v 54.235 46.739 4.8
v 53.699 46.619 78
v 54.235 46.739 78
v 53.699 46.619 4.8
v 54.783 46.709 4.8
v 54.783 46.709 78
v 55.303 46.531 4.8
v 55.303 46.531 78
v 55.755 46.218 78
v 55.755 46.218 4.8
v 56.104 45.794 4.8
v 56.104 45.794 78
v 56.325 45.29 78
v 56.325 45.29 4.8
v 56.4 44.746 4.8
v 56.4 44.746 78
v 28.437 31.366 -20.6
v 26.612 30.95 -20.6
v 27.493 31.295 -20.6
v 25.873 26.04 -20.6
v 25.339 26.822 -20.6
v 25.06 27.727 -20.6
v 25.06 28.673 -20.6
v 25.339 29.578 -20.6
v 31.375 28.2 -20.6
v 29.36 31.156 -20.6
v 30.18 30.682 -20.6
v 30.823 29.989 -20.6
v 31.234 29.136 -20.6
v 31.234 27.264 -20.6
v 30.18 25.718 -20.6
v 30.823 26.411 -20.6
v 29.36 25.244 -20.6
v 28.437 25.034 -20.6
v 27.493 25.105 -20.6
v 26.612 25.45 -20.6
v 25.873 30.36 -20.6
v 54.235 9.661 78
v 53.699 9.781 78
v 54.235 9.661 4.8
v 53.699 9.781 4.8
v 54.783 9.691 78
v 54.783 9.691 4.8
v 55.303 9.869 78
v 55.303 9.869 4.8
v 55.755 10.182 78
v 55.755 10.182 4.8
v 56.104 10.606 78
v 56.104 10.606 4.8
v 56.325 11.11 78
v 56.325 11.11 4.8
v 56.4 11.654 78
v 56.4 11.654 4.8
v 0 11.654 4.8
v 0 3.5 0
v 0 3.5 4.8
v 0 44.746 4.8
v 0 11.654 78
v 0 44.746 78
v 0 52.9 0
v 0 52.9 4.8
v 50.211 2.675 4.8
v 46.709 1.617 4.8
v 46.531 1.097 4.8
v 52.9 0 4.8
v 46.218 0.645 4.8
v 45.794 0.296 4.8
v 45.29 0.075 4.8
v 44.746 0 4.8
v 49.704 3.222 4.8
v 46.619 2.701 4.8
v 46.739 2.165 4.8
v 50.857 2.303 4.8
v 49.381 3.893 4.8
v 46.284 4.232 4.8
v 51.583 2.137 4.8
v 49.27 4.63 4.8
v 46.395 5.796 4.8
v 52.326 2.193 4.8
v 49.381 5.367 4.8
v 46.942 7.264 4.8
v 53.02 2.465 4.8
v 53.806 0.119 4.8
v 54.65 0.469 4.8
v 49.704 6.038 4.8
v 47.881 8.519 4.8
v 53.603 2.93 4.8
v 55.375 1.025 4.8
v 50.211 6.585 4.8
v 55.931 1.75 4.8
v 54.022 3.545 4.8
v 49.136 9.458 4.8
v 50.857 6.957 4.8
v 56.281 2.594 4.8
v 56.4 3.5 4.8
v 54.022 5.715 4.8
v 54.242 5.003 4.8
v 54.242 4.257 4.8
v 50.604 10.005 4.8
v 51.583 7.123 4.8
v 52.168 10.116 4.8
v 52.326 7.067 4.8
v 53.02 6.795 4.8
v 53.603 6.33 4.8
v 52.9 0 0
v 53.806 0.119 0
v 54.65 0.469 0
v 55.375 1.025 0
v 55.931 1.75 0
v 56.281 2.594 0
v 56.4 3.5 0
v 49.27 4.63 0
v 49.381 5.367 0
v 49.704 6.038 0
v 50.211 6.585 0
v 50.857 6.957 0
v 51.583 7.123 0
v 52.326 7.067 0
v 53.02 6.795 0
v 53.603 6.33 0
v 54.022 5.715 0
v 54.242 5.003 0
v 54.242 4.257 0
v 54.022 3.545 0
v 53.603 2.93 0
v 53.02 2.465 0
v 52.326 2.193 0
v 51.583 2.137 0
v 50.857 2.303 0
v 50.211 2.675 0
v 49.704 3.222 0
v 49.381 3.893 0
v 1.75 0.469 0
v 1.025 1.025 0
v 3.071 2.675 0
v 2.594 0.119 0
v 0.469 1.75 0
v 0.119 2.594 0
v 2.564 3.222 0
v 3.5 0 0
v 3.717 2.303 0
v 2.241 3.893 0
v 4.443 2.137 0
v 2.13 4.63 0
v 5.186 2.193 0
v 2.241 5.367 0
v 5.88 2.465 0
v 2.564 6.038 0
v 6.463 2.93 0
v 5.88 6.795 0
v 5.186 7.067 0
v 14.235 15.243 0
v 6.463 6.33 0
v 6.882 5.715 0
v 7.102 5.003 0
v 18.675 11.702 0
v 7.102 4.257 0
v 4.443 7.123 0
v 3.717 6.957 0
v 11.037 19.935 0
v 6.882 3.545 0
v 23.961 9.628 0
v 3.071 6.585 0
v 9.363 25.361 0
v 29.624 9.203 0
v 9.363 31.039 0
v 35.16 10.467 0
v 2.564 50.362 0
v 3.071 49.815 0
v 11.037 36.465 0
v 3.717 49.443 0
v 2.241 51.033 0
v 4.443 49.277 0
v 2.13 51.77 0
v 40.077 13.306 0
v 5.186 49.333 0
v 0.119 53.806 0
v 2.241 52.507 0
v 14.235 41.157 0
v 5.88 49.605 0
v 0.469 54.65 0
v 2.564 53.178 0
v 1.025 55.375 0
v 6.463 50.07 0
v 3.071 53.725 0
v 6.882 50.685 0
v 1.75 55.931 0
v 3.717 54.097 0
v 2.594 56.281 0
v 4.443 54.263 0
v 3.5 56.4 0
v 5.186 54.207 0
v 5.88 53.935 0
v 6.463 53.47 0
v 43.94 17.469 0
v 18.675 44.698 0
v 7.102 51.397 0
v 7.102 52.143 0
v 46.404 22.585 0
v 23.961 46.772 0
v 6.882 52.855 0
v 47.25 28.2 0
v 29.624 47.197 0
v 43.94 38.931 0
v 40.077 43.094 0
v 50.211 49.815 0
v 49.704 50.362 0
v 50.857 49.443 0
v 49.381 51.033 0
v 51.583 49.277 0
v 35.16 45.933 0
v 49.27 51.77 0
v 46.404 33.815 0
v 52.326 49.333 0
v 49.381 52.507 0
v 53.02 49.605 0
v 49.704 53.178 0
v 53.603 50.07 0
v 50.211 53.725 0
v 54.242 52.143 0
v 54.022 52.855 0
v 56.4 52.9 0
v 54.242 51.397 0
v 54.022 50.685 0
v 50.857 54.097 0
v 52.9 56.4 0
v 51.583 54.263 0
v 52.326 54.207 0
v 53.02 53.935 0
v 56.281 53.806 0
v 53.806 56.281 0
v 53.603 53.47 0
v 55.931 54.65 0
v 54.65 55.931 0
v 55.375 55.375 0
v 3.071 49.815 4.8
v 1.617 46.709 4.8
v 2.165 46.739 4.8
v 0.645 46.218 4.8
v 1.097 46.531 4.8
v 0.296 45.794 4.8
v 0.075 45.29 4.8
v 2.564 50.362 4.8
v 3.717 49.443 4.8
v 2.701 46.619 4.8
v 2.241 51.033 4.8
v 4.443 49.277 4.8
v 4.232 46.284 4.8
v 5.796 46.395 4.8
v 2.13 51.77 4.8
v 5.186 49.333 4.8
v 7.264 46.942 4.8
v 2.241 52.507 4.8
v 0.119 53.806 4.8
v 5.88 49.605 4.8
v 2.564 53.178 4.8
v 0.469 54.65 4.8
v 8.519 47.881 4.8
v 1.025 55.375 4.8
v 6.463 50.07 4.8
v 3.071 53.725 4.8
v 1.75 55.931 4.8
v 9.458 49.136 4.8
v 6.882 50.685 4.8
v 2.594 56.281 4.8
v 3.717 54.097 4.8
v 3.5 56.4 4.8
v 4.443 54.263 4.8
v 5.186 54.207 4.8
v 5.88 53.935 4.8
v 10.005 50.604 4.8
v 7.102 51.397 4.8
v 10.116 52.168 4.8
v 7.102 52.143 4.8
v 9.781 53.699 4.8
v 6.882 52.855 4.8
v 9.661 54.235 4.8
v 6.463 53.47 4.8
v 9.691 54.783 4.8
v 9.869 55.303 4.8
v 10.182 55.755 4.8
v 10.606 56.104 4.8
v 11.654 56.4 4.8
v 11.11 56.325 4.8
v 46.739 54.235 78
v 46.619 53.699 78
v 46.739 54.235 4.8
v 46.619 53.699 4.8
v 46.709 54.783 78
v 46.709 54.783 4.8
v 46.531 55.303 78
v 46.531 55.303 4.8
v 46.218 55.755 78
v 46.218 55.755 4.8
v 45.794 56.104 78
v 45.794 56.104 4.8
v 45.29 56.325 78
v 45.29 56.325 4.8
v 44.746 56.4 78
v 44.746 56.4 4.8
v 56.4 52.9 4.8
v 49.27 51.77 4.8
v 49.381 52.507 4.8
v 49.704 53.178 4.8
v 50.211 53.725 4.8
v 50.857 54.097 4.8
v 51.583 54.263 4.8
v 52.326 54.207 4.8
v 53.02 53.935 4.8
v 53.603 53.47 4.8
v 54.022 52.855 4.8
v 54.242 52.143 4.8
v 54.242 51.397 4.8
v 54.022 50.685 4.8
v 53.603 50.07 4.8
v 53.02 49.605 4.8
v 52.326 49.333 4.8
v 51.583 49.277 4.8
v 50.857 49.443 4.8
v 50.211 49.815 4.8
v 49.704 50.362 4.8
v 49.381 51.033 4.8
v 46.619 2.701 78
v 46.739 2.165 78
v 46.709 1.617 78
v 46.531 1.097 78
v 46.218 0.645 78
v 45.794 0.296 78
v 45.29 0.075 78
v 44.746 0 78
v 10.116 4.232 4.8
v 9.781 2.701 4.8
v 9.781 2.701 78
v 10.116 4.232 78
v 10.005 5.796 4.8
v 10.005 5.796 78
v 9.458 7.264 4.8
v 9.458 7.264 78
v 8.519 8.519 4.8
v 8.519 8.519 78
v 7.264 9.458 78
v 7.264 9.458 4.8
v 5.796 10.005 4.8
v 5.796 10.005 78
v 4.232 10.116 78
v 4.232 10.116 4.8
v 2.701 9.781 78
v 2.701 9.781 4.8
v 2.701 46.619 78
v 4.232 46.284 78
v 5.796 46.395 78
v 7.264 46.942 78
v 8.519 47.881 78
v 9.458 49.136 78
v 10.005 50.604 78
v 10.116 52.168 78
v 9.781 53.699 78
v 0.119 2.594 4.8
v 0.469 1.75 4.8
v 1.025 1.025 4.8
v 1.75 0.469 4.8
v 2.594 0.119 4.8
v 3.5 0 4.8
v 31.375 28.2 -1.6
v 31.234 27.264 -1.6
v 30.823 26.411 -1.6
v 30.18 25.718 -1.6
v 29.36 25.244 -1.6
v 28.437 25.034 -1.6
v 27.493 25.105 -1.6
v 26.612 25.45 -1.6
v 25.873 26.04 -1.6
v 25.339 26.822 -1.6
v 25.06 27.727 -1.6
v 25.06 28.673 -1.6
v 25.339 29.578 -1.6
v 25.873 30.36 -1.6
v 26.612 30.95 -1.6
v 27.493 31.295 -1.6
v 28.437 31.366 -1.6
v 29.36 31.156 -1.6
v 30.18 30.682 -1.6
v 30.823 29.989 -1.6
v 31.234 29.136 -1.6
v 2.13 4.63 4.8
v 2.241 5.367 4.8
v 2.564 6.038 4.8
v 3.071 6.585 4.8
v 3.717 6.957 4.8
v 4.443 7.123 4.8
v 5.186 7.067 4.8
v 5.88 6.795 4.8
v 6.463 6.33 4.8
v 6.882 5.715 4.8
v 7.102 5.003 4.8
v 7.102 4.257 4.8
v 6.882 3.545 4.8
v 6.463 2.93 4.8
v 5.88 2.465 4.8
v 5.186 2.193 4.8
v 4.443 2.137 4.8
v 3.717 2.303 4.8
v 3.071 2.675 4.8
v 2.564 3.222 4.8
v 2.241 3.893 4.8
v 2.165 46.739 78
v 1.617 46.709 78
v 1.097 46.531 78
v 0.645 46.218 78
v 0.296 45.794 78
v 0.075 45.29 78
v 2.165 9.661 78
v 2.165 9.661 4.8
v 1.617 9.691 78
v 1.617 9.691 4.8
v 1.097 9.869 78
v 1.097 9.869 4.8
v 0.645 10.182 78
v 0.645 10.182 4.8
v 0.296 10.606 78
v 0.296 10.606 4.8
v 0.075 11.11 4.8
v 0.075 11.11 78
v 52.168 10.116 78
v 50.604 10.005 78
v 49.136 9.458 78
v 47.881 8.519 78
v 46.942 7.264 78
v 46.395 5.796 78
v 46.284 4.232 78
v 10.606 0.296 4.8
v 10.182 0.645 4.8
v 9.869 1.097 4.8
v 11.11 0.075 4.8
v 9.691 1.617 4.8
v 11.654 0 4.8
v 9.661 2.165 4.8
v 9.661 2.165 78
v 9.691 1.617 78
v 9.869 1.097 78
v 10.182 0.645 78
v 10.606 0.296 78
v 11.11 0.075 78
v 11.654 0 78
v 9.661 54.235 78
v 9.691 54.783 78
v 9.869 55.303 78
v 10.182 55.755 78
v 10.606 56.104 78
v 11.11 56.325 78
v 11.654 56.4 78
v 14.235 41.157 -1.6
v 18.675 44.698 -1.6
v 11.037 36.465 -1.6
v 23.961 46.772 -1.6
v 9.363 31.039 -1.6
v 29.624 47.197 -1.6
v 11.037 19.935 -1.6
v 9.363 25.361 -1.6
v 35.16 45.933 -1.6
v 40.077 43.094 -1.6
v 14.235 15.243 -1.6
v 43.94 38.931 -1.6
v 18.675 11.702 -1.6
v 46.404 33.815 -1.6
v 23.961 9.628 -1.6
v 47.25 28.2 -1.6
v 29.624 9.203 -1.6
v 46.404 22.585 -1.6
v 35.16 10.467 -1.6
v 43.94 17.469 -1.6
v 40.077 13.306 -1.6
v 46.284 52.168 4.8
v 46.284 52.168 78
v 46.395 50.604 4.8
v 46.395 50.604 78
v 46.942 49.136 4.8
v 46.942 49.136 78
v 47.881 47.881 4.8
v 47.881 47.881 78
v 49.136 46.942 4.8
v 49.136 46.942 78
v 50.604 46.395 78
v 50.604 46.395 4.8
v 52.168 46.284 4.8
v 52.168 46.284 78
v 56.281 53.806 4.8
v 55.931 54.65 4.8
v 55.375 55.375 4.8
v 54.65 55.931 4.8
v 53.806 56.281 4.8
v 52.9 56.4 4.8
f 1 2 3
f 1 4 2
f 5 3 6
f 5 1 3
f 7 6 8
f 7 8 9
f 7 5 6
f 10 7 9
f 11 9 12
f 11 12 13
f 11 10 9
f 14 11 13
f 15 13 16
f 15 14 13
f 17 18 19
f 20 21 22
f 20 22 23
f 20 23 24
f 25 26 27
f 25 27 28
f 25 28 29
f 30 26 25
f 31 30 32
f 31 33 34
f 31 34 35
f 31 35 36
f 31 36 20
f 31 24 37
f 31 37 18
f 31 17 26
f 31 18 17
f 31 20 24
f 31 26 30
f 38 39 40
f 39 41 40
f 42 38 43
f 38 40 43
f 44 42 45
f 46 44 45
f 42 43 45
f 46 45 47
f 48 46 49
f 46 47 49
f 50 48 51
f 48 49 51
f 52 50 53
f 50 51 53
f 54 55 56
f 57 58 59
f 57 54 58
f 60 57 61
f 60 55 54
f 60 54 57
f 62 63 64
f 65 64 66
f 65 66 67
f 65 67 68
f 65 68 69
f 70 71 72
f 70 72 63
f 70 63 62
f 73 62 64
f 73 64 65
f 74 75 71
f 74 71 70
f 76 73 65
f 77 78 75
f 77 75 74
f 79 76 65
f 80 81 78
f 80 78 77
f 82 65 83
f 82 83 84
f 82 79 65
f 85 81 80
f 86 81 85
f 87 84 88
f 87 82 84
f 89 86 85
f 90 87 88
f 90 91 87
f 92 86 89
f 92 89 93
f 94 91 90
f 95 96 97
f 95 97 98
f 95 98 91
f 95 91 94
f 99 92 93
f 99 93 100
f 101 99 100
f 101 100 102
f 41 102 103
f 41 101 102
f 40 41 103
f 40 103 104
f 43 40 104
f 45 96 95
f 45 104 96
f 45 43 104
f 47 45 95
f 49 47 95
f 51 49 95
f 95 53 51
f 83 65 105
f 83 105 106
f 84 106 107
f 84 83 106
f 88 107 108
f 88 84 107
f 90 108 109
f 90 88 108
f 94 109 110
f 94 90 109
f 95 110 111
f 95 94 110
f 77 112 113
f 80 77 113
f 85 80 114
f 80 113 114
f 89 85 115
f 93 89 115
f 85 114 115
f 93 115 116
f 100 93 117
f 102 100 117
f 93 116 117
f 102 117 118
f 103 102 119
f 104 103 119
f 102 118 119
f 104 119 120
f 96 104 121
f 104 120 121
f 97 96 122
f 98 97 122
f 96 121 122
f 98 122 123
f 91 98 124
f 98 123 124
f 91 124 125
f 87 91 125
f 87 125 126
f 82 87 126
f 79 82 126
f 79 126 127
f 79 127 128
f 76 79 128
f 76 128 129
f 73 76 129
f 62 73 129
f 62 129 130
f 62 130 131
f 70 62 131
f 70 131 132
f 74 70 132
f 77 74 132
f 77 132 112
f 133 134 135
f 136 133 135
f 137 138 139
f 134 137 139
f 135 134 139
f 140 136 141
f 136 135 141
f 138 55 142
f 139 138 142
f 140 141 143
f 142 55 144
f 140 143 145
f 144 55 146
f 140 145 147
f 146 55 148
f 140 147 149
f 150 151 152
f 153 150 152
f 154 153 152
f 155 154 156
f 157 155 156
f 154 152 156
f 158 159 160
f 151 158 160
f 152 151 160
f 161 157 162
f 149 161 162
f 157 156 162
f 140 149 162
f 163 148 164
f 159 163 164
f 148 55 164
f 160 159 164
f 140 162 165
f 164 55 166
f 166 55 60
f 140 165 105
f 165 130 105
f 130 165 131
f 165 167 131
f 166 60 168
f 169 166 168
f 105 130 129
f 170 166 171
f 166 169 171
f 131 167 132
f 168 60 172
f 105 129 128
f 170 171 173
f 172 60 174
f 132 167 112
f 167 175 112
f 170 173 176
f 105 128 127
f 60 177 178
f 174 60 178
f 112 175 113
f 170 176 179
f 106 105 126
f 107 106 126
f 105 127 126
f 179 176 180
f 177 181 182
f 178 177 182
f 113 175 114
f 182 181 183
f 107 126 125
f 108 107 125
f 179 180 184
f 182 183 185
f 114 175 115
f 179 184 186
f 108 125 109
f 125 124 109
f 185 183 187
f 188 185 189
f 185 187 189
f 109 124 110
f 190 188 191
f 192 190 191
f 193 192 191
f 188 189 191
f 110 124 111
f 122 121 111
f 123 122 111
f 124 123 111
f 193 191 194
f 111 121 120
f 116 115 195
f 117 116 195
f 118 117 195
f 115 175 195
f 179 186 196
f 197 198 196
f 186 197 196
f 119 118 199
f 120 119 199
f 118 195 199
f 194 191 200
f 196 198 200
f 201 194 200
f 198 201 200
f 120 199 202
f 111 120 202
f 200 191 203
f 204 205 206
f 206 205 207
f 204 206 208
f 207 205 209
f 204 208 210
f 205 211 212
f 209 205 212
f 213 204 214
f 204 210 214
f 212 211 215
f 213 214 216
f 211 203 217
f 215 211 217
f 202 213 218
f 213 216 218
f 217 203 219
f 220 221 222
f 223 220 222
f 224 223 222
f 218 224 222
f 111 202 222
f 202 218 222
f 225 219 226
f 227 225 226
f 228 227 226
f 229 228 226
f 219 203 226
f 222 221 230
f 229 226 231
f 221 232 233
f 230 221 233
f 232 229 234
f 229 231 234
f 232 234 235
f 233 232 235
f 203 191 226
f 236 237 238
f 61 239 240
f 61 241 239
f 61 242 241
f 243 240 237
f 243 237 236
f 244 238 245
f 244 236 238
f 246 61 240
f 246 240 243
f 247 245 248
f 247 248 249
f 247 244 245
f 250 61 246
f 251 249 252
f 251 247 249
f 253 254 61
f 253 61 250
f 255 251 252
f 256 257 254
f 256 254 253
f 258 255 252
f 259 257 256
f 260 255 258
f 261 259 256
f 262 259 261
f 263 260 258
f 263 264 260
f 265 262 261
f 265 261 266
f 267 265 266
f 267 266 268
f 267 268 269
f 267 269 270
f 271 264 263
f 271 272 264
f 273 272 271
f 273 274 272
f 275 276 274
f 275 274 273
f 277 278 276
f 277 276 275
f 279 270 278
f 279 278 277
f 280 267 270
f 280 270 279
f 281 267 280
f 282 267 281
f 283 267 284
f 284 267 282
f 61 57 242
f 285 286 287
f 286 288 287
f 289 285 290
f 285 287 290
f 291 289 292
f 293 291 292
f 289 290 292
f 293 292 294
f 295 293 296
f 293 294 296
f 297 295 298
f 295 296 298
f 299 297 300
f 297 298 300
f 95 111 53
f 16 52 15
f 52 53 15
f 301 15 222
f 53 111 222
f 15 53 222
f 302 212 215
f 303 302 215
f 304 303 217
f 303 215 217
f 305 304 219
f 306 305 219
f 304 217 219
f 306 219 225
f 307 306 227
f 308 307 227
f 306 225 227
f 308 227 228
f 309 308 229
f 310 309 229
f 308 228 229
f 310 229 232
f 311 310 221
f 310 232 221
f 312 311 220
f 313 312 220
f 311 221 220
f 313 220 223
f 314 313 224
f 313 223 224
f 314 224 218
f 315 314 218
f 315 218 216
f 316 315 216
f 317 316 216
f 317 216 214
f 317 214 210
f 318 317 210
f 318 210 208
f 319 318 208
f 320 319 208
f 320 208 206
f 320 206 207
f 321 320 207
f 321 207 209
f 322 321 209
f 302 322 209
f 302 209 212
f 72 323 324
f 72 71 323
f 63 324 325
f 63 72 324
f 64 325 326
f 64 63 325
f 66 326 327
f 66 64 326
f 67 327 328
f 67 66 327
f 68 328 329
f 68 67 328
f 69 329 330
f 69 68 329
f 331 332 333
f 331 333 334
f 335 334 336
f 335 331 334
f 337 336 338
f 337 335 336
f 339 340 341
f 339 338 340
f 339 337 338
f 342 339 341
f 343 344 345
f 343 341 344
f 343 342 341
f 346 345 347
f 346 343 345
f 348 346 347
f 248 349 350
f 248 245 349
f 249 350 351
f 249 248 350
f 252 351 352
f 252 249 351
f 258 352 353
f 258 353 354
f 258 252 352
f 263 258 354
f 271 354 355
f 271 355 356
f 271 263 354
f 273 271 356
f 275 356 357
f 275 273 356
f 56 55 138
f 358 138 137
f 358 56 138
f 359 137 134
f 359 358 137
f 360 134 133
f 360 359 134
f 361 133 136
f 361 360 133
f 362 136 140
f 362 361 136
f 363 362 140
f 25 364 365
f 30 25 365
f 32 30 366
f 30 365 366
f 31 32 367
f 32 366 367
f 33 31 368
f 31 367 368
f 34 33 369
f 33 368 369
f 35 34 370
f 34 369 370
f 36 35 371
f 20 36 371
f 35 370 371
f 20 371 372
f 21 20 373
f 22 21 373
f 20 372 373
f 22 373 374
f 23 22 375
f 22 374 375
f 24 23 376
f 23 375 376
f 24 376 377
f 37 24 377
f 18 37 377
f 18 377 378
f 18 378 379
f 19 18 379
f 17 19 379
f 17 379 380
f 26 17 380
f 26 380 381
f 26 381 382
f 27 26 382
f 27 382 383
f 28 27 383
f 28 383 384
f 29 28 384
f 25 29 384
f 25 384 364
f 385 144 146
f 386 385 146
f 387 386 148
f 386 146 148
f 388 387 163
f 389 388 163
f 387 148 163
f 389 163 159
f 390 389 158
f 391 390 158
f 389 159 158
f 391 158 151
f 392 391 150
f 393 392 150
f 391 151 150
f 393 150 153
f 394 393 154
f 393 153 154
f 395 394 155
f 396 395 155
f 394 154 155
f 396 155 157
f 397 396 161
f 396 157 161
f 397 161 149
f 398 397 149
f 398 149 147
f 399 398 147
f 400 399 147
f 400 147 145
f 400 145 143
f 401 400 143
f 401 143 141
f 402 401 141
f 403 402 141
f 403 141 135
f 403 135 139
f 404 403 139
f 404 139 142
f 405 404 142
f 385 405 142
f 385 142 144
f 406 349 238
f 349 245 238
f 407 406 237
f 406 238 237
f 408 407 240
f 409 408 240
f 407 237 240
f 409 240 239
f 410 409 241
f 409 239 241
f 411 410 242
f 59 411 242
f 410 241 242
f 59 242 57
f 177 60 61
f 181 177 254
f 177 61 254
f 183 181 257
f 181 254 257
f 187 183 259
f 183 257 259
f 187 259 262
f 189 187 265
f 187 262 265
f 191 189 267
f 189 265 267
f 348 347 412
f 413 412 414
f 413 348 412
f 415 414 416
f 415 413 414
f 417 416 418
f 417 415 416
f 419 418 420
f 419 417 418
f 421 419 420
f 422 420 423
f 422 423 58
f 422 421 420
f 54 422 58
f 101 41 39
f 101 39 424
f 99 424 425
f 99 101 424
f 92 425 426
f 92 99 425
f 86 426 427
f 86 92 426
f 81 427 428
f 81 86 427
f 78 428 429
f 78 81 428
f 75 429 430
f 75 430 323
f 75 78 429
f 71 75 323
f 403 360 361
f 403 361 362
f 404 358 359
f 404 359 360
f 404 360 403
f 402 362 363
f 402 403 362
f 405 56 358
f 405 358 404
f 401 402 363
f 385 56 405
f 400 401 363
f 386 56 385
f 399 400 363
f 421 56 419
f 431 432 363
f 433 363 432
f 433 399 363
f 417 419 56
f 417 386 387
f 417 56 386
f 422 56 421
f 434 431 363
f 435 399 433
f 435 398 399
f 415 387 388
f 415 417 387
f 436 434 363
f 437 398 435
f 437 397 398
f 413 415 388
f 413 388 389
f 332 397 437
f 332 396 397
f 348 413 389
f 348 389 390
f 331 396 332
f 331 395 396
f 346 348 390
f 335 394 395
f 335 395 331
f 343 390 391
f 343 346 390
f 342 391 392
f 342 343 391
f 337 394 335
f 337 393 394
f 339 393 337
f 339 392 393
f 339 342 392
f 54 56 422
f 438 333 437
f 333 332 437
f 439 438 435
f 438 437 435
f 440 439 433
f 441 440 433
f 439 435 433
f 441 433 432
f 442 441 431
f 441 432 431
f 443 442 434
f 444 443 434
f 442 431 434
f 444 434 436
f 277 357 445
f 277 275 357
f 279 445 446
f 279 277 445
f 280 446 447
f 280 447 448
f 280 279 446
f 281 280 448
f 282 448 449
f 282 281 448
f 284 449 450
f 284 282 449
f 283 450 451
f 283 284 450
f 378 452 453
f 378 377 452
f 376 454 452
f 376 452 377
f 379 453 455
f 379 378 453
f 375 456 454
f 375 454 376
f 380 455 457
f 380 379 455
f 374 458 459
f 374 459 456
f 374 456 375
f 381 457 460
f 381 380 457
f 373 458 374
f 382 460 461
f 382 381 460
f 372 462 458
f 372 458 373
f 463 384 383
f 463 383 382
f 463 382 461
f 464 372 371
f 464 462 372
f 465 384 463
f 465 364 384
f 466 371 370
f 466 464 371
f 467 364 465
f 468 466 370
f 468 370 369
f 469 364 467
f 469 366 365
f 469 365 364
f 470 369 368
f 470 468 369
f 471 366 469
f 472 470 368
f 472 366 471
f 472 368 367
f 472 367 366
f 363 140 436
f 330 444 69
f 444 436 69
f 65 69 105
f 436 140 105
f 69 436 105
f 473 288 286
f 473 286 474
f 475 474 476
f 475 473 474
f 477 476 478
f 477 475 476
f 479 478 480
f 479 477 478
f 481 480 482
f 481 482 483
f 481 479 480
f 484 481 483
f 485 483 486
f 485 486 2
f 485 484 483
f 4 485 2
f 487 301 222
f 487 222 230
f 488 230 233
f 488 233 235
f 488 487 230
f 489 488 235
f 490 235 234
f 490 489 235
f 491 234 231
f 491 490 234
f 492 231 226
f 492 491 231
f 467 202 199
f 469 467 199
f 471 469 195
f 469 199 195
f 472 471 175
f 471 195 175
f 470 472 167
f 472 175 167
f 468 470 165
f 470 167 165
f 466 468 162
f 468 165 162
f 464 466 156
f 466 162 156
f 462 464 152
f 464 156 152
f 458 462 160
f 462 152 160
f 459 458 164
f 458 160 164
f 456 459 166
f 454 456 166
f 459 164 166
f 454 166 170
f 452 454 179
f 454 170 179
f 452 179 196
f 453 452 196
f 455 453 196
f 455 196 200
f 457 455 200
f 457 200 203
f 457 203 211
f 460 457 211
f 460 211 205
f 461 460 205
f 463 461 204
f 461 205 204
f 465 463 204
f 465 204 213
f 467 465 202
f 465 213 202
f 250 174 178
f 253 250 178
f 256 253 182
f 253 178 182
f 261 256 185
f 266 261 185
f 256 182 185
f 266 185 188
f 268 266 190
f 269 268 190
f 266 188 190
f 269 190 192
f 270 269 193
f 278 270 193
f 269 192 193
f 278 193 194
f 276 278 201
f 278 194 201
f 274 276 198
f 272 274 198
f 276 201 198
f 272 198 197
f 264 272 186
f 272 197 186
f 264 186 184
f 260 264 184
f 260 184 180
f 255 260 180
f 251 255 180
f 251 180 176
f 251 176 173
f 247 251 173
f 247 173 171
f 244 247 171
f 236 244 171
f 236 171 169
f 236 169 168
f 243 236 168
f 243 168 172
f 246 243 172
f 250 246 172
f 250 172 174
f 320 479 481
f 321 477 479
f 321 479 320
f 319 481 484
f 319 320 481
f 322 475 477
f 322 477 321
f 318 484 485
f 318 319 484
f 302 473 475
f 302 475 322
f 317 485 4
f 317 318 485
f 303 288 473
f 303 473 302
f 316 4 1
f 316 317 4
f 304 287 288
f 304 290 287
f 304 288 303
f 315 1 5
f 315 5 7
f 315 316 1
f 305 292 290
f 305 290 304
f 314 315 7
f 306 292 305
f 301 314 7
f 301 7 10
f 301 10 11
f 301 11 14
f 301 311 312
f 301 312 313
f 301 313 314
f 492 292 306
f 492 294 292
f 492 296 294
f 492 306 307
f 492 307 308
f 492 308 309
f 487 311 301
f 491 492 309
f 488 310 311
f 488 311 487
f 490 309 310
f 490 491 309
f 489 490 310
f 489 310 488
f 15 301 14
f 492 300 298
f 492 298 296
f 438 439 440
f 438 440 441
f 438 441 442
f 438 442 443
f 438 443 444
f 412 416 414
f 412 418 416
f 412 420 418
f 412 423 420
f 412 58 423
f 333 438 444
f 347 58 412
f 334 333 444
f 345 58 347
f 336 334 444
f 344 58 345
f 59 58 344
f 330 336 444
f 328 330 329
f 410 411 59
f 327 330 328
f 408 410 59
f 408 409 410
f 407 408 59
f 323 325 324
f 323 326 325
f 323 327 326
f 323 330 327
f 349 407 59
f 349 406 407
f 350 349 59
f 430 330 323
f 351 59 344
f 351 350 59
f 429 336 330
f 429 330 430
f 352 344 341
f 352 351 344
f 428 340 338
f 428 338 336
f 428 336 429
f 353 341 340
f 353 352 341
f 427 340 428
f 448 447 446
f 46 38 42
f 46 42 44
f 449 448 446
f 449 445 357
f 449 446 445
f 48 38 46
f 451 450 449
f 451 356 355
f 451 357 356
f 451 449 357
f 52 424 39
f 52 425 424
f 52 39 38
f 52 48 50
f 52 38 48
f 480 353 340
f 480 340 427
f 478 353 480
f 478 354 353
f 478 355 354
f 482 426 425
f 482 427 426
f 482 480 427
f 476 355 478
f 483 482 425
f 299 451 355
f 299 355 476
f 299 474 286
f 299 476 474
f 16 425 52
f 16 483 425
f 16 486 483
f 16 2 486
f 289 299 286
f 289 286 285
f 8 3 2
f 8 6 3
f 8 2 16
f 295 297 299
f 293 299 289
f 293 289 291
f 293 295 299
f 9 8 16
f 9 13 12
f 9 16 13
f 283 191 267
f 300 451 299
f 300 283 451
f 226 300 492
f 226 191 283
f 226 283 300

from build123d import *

# Parameters (mm, degrees)
SKETCH1_W           = 56.4
SKETCH1_H           = 56.4
BOSS_EXTRUDE1_DEPTH = 78
FILLET1_R           = 3.5
SKETCH2_R           = 19.05
BOSS_EXTRUDE2_DEPTH = 1.6
SKETCH4_R           = 3.175
BOSS_EXTRUDE3_DEPTH = 20.6
SKETCH5_R           = 2.5
CUT_EXTRUDE1_DEPTH  = 112.561283607
CUT_EXTRUDE2_START  = -73.2
SKETCH8_R           = 5.5
CUT_EXTRUDE2_DEPTH  = 73.2
FILLET2_R           = 2


with BuildPart() as part:
    # Sketch1 → Boss-Extrude1 (new body)
    with BuildSketch(Plane.XY):
        with Locations((28.2, 28.2)):
            Rectangle(SKETCH1_W, SKETCH1_H)
    extrude(amount=BOSS_EXTRUDE1_DEPTH)

    # Fillet1
    fillet1_edges = [part.edges().sort_by_distance(p)[0] for p in [
        (0, 56.4, 39),
        (56.4, 56.4, 39),
        (56.4, 0, 39),
        (0, 0, 39),
    ]]
    fillet(fillet1_edges, radius=FILLET1_R)

    # Sketch2 → Boss-Extrude2 (add)
    with BuildSketch(Plane(origin=(0, 0, 0), x_dir=(-1, 0, 0), z_dir=(0, 0, -1))):
        with Locations(Location((-28.2, 28.2, 0), (0, 0, 180))):
            Circle(SKETCH2_R)
    extrude(amount=BOSS_EXTRUDE2_DEPTH)

    # Sketch4 → Boss-Extrude3 (add)
    with BuildSketch(Plane(origin=(0, 0, 0), x_dir=(-1, 0, 0), z_dir=(0, 0, -1))):
        with Locations(Location((-28.2, 28.2, 0), (0, 0, 180))):
            Circle(SKETCH4_R)
    extrude(amount=BOSS_EXTRUDE3_DEPTH)

    # Sketch5 → Cut-Extrude1 (cut, through all)
    with BuildSketch(Plane(origin=(0, 0, 0), x_dir=(-1, 0, 0), z_dir=(0, 0, -1))):
        with Locations((-51.77, 51.77)):
            Circle(SKETCH5_R)
        with Locations((-4.63, 51.77)):
            Circle(SKETCH5_R)
        with Locations((-4.63, 4.63)):
            Circle(SKETCH5_R)
        with Locations((-51.77, 4.63)):
            Circle(SKETCH5_R)
    extrude(amount=-CUT_EXTRUDE1_DEPTH, mode=Mode.SUBTRACT)

    # Sketch8 → Cut-Extrude2 (cut)
    with BuildSketch(Plane.XY.offset(78).offset(CUT_EXTRUDE2_START)):
        with Locations((4.63, 51.77)):
            Circle(SKETCH8_R)
        with Locations((51.77, 51.77)):
            Circle(SKETCH8_R)
        with Locations((51.77, 4.63)):
            Circle(SKETCH8_R)
        with Locations((4.63, 4.63)):
            Circle(SKETCH8_R)
    extrude(amount=CUT_EXTRUDE2_DEPTH, mode=Mode.SUBTRACT)

    # Fillet2
    fillet2_edges = [part.edges().sort_by_distance(p)[0] for p in [
        (0, 7.598686578, 41.4),
        (7.598686578, 0, 41.4),
        (0, 48.801313422, 41.4),
        (7.598686578, 56.4, 41.4),
        (56.4, 48.801313422, 41.4),
        (48.801313422, 56.4, 41.4),
        (48.801313422, 0, 41.4),
        (56.4, 7.598686578, 41.4),
    ]]
    fillet(fillet2_edges, radius=FILLET2_R)


solid = part.part
